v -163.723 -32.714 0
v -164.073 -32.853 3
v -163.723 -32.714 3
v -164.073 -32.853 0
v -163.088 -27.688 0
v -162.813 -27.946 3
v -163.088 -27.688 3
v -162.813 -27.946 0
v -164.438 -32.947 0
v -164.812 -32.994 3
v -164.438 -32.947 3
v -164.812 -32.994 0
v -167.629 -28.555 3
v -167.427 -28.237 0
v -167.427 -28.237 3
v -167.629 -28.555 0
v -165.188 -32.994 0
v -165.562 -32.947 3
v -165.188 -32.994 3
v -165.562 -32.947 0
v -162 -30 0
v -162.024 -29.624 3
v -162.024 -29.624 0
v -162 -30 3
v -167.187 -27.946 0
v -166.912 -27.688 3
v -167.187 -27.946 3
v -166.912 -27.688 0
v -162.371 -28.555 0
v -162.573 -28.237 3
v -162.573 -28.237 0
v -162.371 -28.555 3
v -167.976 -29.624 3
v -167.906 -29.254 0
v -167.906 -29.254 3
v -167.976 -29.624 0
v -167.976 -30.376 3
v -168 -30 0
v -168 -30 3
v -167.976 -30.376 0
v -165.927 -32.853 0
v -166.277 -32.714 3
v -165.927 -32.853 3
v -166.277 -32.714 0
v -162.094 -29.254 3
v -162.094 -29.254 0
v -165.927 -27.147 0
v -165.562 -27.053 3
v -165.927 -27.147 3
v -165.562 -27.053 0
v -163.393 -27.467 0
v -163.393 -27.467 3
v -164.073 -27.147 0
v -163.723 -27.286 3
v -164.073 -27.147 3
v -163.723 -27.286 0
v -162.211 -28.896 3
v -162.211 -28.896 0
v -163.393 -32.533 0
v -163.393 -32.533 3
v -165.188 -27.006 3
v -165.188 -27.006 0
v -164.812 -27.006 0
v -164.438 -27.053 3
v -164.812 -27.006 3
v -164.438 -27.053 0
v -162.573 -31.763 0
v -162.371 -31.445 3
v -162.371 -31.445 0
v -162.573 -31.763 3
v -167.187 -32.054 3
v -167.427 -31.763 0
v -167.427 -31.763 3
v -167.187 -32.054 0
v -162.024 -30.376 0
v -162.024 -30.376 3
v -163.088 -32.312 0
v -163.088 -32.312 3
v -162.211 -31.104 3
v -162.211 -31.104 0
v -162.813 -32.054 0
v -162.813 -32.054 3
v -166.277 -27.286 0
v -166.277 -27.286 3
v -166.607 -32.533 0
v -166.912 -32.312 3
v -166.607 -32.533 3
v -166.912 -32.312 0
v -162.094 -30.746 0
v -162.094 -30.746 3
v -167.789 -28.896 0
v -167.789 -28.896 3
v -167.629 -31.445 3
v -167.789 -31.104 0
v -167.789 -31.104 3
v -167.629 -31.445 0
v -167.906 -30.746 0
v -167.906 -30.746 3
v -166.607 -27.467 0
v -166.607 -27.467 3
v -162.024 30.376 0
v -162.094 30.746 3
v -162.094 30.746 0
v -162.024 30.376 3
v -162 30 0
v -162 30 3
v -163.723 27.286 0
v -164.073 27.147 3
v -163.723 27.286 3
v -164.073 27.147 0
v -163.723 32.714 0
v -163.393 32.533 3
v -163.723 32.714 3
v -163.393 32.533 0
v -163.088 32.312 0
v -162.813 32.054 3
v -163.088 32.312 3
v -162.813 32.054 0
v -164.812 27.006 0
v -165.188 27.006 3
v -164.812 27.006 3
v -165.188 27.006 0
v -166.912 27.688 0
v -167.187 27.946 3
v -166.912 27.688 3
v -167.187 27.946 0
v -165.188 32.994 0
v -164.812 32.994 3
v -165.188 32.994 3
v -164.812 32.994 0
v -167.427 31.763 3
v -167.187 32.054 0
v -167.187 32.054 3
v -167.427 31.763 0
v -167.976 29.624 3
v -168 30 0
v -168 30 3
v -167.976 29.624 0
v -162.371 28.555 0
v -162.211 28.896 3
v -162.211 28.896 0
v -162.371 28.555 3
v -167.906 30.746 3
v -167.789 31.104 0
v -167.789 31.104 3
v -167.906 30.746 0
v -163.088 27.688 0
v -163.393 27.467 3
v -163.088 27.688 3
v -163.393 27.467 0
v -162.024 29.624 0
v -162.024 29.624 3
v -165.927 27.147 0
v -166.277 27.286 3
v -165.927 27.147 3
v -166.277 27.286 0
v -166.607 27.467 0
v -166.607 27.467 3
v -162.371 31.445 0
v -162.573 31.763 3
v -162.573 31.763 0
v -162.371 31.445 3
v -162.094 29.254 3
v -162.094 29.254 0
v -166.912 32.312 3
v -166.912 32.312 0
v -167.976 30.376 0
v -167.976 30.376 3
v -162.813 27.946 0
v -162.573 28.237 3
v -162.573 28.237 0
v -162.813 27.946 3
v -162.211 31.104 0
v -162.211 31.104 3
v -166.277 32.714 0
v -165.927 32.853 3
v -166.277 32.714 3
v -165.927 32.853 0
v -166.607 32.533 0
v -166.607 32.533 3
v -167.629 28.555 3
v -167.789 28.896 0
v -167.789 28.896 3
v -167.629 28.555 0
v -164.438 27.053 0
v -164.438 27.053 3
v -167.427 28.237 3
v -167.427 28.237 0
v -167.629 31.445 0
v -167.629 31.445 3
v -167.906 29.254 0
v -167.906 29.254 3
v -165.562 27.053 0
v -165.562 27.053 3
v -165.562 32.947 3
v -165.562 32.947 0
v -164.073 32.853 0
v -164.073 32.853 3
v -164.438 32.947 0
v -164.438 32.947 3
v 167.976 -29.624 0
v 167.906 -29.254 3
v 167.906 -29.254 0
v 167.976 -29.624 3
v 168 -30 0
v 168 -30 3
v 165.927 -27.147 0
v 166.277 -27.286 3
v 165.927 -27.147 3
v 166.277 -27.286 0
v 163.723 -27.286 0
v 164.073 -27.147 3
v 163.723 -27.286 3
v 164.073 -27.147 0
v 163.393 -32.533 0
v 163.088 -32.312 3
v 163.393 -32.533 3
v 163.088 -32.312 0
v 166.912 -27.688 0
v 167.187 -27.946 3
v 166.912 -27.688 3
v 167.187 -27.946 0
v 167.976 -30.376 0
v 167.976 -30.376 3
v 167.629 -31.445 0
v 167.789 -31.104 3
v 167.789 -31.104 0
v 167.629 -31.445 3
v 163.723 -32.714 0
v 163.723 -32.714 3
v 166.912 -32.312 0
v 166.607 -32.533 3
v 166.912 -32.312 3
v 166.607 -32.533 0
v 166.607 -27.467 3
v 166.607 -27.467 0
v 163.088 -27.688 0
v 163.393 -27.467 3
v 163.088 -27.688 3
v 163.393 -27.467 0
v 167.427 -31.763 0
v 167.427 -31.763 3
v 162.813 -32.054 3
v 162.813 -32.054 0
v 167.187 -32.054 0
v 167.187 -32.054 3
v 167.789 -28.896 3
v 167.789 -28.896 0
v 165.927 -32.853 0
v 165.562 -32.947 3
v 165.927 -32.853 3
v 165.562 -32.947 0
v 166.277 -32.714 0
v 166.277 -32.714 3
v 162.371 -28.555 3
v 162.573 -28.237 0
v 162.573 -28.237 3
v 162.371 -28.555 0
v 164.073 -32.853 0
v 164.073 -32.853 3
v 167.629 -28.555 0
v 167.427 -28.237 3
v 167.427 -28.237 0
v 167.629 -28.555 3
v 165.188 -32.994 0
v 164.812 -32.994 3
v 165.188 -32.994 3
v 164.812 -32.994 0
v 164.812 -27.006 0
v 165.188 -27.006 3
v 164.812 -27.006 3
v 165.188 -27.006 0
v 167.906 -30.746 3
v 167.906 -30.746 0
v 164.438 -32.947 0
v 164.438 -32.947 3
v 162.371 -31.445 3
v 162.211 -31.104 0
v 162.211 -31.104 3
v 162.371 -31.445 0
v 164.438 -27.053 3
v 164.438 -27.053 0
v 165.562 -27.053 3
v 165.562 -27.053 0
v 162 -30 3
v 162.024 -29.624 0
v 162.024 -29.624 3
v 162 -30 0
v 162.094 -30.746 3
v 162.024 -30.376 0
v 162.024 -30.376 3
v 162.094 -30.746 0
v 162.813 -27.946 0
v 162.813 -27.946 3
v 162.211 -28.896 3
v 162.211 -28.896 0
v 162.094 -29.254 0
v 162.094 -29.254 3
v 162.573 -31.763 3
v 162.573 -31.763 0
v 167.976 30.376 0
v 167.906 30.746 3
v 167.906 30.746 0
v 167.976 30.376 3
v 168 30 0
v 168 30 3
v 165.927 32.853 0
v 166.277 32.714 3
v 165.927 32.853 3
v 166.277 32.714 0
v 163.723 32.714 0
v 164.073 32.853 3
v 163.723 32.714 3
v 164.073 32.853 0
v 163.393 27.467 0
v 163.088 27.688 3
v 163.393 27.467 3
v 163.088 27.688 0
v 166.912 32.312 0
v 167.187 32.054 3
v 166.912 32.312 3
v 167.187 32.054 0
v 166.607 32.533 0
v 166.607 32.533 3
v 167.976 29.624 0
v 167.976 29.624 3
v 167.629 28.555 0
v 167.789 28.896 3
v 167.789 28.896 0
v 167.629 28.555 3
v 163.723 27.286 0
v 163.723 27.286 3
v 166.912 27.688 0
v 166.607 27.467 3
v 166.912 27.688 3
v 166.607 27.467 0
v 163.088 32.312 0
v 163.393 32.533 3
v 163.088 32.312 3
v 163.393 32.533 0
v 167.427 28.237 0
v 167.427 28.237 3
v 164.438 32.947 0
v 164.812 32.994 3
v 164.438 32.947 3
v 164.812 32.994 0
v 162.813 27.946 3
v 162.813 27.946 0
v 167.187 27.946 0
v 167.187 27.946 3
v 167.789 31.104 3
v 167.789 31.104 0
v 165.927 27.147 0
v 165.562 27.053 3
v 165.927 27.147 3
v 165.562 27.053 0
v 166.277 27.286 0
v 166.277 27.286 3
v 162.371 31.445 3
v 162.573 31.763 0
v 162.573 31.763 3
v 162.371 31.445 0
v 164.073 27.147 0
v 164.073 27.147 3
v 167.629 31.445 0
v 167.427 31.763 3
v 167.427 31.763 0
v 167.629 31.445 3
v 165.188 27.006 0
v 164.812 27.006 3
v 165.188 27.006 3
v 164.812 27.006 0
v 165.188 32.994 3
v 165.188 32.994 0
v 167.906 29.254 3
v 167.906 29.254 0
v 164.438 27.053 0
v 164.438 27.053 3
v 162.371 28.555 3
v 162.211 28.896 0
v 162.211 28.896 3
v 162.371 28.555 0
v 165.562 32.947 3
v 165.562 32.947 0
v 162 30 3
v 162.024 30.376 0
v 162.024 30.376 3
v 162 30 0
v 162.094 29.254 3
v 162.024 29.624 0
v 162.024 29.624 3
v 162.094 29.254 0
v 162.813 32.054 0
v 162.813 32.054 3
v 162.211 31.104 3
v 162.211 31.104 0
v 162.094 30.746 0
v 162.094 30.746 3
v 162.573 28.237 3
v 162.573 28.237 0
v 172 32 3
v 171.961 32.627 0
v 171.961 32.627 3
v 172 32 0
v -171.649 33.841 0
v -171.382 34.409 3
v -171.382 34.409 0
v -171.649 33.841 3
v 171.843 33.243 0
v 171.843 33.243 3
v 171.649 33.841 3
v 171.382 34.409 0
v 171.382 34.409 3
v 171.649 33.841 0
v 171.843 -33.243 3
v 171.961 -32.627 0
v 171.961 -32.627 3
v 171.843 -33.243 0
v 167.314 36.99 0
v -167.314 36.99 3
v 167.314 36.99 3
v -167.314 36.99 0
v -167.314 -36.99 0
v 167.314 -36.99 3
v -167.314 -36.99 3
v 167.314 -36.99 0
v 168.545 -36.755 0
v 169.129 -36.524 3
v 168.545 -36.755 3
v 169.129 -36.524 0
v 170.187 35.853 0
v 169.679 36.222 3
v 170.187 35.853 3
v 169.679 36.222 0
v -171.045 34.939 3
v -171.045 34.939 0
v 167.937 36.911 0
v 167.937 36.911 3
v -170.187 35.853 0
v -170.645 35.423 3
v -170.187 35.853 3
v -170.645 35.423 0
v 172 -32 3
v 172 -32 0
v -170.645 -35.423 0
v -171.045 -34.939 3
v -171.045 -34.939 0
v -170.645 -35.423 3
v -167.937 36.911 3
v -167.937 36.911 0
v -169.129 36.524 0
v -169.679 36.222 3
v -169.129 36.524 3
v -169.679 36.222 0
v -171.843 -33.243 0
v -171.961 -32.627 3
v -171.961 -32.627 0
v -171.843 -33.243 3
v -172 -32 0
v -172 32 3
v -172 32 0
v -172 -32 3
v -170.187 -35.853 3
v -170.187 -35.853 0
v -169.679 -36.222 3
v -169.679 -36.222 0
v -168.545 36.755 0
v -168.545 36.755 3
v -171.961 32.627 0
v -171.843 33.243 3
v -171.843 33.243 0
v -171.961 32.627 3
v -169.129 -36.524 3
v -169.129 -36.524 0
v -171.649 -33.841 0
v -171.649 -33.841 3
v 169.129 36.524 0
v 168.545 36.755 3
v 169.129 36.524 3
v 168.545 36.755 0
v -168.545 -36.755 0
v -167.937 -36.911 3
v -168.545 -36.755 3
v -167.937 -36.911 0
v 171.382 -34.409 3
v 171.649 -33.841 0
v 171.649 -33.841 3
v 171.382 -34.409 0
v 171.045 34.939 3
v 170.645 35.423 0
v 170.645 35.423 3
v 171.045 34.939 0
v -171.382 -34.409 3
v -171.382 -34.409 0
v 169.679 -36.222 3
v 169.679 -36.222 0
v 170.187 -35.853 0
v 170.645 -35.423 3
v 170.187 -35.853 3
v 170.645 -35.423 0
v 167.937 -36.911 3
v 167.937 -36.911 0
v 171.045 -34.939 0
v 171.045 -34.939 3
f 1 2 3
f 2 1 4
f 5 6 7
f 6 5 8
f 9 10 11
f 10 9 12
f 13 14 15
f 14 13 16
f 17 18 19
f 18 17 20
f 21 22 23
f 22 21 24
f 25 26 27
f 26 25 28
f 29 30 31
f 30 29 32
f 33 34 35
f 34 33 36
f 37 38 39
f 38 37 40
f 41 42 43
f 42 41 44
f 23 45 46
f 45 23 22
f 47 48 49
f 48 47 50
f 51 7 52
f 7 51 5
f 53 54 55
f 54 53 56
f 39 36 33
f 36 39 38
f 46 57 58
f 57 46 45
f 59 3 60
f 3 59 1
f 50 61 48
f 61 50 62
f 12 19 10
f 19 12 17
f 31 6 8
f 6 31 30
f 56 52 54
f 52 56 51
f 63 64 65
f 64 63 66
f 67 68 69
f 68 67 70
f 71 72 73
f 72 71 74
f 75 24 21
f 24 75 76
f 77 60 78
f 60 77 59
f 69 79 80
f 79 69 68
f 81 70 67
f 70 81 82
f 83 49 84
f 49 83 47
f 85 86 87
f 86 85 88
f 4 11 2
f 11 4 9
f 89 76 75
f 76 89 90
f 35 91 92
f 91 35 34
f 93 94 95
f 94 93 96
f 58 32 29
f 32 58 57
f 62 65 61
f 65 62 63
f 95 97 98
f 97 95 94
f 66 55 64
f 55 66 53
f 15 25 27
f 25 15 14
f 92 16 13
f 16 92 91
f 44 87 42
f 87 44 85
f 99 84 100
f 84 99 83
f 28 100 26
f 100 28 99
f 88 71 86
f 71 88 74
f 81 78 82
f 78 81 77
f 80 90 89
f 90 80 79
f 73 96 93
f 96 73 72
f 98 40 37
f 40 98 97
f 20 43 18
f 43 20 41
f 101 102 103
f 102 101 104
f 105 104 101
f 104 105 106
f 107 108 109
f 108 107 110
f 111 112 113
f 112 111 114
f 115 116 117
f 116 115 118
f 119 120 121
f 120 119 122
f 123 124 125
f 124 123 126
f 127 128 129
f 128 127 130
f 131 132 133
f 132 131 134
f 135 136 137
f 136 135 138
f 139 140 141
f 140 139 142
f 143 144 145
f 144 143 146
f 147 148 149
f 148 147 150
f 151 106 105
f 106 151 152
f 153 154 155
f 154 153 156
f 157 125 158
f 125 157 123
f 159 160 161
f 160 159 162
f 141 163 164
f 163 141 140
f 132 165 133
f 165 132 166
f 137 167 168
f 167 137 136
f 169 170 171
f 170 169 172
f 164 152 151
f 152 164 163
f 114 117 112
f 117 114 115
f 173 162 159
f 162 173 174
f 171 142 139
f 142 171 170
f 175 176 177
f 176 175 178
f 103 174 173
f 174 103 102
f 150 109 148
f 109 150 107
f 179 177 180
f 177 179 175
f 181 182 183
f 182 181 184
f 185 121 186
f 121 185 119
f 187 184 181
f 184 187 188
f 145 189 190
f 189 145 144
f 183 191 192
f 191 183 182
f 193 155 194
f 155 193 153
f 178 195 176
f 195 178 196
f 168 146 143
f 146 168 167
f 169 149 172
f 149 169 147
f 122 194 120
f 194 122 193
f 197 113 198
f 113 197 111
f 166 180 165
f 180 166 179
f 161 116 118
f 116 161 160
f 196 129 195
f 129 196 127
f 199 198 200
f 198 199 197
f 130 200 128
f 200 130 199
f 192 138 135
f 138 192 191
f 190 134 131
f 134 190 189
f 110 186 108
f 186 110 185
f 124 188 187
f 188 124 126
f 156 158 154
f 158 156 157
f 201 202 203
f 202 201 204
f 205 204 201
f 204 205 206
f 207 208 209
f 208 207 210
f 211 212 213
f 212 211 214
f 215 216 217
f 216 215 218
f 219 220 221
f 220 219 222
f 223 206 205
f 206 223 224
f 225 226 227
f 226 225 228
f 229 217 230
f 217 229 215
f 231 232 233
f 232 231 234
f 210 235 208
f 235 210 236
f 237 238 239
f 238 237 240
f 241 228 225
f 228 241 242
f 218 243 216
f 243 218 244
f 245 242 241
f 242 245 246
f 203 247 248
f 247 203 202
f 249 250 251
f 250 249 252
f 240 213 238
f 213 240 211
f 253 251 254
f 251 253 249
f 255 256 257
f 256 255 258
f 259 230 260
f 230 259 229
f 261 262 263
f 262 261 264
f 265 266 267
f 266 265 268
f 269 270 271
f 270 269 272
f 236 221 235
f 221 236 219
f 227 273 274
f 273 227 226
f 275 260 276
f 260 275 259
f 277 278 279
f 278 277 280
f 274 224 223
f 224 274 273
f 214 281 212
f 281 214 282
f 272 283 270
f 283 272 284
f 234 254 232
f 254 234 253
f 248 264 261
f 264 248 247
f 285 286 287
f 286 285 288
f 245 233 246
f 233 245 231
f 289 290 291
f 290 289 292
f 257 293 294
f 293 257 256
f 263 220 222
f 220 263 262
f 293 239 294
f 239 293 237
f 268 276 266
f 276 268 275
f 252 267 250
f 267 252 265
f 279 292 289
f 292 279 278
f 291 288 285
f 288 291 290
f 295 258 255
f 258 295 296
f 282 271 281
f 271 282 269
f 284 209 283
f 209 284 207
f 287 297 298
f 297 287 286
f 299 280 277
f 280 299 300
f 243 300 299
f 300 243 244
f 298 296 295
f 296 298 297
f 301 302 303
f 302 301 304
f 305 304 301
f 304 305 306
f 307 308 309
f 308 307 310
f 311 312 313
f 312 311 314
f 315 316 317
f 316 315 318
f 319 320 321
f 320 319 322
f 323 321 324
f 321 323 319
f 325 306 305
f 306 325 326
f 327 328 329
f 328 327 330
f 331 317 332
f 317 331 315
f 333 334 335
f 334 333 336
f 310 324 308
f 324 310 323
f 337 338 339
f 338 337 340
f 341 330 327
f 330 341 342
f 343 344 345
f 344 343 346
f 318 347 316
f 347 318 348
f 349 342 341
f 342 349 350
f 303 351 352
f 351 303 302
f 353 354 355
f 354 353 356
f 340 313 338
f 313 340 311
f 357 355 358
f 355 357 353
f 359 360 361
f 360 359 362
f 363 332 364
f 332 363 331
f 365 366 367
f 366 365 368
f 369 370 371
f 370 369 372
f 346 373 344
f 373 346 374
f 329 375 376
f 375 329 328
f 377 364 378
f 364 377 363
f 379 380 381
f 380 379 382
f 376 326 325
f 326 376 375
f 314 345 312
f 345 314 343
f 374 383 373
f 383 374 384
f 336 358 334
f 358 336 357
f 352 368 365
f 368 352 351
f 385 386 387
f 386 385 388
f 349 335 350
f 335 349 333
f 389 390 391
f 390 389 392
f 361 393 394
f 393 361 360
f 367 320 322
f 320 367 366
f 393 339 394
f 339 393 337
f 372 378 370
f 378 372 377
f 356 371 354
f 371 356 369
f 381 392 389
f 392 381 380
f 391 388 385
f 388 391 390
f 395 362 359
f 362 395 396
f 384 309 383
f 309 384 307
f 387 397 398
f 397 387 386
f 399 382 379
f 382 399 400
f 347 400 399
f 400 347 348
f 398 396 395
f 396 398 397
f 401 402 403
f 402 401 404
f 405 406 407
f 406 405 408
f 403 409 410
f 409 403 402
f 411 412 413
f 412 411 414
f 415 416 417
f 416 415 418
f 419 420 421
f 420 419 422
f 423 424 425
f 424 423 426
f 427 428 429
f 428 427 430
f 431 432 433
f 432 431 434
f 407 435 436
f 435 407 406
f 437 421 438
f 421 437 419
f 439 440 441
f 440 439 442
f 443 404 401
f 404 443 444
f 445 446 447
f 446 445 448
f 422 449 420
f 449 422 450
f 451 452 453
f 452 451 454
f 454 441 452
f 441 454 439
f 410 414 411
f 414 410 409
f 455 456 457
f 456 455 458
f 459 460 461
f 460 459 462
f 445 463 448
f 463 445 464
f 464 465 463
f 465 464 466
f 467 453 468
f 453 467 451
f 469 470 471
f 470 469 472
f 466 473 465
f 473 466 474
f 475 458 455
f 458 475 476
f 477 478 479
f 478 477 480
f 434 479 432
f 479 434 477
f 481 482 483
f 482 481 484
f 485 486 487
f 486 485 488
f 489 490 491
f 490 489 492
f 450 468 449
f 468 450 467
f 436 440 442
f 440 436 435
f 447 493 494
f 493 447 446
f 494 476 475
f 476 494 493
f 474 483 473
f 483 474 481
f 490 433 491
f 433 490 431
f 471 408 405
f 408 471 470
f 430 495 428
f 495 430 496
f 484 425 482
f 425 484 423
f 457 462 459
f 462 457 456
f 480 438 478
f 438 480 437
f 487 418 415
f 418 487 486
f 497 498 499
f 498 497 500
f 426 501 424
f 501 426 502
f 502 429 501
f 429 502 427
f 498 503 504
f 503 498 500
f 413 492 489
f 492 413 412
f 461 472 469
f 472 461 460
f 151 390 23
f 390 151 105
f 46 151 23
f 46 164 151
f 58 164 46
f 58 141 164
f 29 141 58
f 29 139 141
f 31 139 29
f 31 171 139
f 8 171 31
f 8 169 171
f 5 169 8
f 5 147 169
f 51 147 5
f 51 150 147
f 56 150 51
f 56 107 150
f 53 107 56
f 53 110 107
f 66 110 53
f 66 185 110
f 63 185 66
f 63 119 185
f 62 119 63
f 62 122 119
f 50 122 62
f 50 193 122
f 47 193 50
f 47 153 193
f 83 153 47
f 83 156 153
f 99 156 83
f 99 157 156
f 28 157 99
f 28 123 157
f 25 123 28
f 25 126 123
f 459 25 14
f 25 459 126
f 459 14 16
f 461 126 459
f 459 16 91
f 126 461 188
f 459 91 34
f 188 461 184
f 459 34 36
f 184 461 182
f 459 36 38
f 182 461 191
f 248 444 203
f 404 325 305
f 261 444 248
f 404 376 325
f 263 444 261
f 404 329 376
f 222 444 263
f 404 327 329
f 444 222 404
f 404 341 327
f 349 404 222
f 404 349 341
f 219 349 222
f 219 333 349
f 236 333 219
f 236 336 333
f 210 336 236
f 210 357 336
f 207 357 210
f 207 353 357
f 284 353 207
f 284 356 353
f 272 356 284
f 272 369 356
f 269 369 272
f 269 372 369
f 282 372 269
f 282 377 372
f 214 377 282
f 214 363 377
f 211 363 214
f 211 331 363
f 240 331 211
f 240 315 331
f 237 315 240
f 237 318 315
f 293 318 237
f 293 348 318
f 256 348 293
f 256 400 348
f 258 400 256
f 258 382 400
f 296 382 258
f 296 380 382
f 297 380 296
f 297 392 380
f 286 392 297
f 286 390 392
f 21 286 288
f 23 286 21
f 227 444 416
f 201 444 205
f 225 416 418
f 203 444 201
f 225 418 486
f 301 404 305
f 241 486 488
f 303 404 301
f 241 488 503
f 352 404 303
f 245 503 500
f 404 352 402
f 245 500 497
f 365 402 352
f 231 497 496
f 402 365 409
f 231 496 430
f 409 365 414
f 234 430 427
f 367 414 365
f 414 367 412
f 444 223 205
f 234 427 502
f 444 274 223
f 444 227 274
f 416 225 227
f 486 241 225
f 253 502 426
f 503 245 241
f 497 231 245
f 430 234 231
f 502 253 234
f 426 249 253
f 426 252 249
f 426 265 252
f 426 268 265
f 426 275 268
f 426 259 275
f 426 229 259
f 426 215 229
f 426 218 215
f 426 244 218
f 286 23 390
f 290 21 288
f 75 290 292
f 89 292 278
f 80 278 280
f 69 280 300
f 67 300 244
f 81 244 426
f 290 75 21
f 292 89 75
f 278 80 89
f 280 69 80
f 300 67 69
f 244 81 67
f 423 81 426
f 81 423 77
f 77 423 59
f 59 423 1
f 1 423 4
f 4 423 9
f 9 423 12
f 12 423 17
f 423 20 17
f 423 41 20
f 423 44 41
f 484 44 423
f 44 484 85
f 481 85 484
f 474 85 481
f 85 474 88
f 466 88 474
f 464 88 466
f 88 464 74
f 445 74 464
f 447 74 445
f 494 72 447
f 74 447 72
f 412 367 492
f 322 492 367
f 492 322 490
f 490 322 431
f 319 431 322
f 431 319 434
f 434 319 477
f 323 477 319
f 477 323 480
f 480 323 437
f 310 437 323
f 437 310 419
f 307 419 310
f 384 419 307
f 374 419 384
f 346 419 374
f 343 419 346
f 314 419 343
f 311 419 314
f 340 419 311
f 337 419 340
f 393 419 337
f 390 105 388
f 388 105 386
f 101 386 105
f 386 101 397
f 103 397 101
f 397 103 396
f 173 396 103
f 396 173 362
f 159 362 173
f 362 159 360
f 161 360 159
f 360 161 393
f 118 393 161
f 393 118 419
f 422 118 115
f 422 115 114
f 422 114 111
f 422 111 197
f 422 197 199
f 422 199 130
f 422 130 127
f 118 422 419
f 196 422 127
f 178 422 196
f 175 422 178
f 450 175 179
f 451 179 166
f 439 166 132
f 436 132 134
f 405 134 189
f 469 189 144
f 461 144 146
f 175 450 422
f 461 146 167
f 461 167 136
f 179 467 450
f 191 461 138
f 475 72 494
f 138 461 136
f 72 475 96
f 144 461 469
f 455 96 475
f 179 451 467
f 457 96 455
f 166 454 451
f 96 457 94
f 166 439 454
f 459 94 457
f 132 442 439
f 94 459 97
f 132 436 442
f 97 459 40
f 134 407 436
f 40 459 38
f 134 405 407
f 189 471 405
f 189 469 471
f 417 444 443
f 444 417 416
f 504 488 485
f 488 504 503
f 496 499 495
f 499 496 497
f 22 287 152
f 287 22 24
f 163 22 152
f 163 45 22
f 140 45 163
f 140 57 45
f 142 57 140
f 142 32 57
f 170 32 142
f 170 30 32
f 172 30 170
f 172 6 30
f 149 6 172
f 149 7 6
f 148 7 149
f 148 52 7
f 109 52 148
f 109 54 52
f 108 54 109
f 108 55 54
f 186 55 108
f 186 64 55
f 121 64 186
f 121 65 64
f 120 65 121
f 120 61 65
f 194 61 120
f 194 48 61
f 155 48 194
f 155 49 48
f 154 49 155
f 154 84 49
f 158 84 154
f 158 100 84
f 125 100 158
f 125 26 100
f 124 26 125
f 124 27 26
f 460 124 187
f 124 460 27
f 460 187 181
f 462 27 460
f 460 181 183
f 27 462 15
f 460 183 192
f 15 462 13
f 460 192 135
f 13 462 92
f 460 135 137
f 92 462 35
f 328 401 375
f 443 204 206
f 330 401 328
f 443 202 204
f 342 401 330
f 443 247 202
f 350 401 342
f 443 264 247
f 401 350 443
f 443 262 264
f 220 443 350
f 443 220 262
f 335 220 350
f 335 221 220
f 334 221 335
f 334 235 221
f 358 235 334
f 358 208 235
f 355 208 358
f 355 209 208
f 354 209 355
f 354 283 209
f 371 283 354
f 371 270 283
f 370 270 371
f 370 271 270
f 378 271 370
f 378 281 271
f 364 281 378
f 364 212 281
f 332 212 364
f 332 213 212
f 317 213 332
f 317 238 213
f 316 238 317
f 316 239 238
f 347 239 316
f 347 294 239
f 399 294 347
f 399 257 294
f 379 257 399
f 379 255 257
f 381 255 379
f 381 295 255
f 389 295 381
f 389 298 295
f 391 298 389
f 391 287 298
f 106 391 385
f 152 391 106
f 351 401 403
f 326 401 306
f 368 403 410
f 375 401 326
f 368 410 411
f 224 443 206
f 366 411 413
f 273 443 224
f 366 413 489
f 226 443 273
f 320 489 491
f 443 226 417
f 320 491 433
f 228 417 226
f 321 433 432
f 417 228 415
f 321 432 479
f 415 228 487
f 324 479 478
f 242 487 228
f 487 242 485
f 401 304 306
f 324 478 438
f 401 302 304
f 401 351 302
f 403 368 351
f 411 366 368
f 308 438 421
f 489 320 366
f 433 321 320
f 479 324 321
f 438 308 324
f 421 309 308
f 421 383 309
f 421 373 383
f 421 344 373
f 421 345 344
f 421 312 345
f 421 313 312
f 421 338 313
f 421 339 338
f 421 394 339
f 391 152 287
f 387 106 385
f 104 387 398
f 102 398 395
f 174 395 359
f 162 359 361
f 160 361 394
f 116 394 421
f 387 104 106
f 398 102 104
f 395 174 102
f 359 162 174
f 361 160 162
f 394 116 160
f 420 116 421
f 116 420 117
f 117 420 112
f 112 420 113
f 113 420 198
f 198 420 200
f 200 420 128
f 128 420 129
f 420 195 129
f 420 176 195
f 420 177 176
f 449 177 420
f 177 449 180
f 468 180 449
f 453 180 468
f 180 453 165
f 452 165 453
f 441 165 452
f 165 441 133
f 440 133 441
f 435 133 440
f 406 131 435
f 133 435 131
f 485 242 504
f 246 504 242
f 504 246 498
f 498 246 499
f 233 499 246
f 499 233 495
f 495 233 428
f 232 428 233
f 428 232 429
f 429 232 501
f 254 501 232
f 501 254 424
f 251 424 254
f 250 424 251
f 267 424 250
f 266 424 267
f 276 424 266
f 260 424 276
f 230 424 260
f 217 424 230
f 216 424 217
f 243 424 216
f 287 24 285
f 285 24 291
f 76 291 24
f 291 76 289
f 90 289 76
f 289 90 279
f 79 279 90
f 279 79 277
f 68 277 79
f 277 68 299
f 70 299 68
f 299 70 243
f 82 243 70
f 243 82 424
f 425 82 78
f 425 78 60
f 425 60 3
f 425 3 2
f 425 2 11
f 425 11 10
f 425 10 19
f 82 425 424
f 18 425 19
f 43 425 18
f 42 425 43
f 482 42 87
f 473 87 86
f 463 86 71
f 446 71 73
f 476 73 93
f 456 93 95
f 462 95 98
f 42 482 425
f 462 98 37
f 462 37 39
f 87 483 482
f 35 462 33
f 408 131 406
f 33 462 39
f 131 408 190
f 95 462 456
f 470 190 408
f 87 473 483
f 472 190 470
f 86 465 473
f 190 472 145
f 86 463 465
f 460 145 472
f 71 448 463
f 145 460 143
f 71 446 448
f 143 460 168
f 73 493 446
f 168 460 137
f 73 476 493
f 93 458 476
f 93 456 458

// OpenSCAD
$fn = 50;


difference() {
	union() {
		hull() {
			translate(v = [-167.0000000000, 32.0000000000, 0]) {
				cylinder(h = 3, r = 5);
			}
			translate(v = [167.0000000000, 32.0000000000, 0]) {
				cylinder(h = 3, r = 5);
			}
			translate(v = [-167.0000000000, -32.0000000000, 0]) {
				cylinder(h = 3, r = 5);
			}
			translate(v = [167.0000000000, -32.0000000000, 0]) {
				cylinder(h = 3, r = 5);
			}
		}
	}
	union() {
		translate(v = [-165.0000000000, -30.0000000000, -100.0000000000]) {
			cylinder(h = 200, r = 3.0000000000);
		}
		translate(v = [-165.0000000000, 30.0000000000, -100.0000000000]) {
			cylinder(h = 200, r = 3.0000000000);
		}
		translate(v = [165.0000000000, -30.0000000000, -100.0000000000]) {
			cylinder(h = 200, r = 3.0000000000);
		}
		translate(v = [165.0000000000, 30.0000000000, -100.0000000000]) {
			cylinder(h = 200, r = 3.0000000000);
		}
	}
}
